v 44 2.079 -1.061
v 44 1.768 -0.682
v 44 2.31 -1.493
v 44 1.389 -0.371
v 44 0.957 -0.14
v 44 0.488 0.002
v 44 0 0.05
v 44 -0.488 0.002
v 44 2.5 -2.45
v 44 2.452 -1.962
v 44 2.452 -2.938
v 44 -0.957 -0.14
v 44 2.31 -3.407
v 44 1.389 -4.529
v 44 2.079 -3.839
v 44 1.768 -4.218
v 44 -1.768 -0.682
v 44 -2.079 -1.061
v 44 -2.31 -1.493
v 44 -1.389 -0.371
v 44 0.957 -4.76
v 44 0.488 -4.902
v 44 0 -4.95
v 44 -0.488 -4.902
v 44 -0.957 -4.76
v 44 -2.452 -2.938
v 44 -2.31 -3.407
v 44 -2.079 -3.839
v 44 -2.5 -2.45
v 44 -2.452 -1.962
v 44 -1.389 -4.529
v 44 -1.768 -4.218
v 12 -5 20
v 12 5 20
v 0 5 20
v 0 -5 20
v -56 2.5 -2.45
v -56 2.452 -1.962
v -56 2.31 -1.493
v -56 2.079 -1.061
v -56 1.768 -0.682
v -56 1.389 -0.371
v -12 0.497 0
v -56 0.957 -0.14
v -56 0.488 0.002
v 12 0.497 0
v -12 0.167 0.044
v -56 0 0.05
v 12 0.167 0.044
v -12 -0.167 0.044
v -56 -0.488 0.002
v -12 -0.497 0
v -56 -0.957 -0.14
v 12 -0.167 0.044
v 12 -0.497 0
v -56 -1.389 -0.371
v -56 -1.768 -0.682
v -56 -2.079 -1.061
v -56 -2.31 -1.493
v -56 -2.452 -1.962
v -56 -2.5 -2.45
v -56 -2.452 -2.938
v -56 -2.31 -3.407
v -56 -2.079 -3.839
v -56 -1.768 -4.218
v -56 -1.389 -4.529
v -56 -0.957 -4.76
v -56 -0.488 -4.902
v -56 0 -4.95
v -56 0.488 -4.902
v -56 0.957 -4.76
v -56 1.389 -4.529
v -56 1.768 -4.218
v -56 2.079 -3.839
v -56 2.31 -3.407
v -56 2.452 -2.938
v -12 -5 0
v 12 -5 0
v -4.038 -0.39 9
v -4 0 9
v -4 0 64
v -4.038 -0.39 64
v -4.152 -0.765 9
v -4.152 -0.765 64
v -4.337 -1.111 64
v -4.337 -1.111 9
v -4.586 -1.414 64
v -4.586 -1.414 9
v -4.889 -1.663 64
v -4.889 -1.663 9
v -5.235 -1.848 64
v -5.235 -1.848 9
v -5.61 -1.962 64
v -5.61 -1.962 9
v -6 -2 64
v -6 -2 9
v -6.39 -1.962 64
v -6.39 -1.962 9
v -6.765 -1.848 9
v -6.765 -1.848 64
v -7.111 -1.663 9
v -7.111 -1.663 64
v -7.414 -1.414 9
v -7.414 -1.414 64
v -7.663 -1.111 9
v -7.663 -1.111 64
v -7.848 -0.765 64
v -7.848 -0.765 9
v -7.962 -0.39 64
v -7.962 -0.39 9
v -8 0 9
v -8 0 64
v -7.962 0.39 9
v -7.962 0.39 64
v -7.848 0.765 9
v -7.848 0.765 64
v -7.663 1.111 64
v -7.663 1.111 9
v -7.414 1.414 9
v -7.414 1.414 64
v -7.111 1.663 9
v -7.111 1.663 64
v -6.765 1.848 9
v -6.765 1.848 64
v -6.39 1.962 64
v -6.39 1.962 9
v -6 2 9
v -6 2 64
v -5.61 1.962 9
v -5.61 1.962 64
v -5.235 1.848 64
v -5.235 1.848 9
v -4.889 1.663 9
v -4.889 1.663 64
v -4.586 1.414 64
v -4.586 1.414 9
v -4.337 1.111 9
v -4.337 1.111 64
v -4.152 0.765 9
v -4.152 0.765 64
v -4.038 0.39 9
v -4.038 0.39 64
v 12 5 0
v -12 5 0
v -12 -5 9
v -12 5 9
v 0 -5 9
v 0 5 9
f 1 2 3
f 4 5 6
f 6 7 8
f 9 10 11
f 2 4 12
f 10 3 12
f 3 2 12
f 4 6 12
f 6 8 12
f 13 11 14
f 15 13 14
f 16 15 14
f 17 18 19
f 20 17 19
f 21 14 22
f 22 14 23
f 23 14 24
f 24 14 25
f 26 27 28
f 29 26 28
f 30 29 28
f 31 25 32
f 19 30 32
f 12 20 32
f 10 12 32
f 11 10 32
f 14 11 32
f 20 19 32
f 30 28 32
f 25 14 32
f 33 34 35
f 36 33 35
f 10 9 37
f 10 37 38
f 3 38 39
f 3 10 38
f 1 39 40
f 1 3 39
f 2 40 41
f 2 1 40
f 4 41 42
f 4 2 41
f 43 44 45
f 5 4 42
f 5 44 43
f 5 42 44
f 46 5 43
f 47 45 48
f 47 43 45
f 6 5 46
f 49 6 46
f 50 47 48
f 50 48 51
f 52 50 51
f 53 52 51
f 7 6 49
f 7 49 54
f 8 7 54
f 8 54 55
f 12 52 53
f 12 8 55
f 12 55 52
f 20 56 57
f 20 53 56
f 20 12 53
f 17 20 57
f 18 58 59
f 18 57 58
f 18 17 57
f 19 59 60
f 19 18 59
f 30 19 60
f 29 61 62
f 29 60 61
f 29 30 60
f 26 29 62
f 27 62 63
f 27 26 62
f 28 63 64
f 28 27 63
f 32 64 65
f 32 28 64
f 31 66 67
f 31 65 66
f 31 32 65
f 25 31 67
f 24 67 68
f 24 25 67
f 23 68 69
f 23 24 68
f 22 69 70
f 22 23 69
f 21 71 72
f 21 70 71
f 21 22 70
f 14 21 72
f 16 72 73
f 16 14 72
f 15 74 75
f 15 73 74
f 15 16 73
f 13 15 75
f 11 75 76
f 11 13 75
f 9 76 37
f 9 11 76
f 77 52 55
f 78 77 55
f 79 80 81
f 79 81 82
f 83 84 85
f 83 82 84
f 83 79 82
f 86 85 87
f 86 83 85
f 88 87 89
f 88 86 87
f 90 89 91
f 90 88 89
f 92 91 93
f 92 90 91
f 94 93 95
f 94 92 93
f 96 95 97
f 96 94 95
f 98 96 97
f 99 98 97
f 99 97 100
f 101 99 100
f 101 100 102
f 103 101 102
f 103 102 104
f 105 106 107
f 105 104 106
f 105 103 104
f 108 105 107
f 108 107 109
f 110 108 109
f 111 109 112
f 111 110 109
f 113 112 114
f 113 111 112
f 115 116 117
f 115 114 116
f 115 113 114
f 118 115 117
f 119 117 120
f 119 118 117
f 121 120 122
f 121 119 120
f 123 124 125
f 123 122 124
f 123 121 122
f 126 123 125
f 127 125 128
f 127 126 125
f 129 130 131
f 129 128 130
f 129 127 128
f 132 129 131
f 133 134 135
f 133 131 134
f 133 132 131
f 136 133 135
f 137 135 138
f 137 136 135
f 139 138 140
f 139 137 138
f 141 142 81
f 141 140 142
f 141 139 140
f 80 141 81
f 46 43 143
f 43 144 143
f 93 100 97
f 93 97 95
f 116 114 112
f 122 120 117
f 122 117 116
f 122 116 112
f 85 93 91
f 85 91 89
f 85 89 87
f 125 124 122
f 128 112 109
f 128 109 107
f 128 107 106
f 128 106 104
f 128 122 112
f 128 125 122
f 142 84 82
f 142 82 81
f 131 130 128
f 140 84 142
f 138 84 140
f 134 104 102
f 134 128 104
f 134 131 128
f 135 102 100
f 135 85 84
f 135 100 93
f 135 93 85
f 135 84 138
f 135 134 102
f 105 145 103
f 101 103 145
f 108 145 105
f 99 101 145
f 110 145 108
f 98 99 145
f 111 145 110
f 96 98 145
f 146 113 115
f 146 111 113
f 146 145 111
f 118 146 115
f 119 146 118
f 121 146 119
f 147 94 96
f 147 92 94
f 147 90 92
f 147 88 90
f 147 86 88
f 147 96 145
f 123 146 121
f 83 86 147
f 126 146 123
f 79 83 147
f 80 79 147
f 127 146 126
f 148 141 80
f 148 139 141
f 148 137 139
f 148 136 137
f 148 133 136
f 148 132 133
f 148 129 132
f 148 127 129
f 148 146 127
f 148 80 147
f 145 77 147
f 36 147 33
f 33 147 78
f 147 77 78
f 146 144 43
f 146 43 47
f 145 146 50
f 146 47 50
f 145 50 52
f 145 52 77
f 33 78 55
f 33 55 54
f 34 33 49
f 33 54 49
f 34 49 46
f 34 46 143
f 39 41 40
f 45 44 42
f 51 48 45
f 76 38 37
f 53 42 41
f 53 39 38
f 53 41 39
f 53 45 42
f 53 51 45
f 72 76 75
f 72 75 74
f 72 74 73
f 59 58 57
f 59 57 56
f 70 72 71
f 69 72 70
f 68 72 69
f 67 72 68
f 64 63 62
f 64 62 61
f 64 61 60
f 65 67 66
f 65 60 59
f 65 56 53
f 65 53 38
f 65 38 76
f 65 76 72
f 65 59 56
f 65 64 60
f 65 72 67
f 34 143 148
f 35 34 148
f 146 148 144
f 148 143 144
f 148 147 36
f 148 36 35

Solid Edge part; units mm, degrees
sketch "Sketch1" plane through (0, 0, 0) normal (0, 0, 1) x (1, 0, 0)
  line L0 (-12, -5) -> (12, -5)
  line L1 (12, -5) -> (12, 5)
  line L2 (12, 5) -> (-12, 5)
  line L3 (-12, 5) -> (-12, -5)
extrude "Protrusion1" add sketch "Sketch1" along normal blind 9
sketch "Sketch2" plane through (0, 0, 9) normal (0, 0, 1) x (1, 0, 0)
  line L0 (12, 5) -> (12, -5)
  line L1 (12, -5) -> (0, -5)
  line L2 (0, -5) -> (0, 5)
  line L3 (0, 5) -> (12, 5)
extrude "Wyciągnięcie_2" add sketch "Sketch2" along normal blind 11
sketch "Sketch3" plane through (-6, 0, 9) normal (0, 0, 1) x (1, 0, 0)
  circle A0 centre (0, 0) radius 2
extrude "Wyciągnięcie_3" add sketch "Sketch3" along normal blind 55
cosmetic_thread "Thread1" size "M4"
sketch "Sketch4" plane through (-6, 0, 4.5) normal (-1, 0, 0) x (0, 1, 0)
  circle A0 centre (0, 6.95) radius 2.5
  dimension "D1" = 5
  dimension "D2" = 2.45
extrude "Wyciągnięcie_6" add sketch "Sketch4" along normal mid plane 100
